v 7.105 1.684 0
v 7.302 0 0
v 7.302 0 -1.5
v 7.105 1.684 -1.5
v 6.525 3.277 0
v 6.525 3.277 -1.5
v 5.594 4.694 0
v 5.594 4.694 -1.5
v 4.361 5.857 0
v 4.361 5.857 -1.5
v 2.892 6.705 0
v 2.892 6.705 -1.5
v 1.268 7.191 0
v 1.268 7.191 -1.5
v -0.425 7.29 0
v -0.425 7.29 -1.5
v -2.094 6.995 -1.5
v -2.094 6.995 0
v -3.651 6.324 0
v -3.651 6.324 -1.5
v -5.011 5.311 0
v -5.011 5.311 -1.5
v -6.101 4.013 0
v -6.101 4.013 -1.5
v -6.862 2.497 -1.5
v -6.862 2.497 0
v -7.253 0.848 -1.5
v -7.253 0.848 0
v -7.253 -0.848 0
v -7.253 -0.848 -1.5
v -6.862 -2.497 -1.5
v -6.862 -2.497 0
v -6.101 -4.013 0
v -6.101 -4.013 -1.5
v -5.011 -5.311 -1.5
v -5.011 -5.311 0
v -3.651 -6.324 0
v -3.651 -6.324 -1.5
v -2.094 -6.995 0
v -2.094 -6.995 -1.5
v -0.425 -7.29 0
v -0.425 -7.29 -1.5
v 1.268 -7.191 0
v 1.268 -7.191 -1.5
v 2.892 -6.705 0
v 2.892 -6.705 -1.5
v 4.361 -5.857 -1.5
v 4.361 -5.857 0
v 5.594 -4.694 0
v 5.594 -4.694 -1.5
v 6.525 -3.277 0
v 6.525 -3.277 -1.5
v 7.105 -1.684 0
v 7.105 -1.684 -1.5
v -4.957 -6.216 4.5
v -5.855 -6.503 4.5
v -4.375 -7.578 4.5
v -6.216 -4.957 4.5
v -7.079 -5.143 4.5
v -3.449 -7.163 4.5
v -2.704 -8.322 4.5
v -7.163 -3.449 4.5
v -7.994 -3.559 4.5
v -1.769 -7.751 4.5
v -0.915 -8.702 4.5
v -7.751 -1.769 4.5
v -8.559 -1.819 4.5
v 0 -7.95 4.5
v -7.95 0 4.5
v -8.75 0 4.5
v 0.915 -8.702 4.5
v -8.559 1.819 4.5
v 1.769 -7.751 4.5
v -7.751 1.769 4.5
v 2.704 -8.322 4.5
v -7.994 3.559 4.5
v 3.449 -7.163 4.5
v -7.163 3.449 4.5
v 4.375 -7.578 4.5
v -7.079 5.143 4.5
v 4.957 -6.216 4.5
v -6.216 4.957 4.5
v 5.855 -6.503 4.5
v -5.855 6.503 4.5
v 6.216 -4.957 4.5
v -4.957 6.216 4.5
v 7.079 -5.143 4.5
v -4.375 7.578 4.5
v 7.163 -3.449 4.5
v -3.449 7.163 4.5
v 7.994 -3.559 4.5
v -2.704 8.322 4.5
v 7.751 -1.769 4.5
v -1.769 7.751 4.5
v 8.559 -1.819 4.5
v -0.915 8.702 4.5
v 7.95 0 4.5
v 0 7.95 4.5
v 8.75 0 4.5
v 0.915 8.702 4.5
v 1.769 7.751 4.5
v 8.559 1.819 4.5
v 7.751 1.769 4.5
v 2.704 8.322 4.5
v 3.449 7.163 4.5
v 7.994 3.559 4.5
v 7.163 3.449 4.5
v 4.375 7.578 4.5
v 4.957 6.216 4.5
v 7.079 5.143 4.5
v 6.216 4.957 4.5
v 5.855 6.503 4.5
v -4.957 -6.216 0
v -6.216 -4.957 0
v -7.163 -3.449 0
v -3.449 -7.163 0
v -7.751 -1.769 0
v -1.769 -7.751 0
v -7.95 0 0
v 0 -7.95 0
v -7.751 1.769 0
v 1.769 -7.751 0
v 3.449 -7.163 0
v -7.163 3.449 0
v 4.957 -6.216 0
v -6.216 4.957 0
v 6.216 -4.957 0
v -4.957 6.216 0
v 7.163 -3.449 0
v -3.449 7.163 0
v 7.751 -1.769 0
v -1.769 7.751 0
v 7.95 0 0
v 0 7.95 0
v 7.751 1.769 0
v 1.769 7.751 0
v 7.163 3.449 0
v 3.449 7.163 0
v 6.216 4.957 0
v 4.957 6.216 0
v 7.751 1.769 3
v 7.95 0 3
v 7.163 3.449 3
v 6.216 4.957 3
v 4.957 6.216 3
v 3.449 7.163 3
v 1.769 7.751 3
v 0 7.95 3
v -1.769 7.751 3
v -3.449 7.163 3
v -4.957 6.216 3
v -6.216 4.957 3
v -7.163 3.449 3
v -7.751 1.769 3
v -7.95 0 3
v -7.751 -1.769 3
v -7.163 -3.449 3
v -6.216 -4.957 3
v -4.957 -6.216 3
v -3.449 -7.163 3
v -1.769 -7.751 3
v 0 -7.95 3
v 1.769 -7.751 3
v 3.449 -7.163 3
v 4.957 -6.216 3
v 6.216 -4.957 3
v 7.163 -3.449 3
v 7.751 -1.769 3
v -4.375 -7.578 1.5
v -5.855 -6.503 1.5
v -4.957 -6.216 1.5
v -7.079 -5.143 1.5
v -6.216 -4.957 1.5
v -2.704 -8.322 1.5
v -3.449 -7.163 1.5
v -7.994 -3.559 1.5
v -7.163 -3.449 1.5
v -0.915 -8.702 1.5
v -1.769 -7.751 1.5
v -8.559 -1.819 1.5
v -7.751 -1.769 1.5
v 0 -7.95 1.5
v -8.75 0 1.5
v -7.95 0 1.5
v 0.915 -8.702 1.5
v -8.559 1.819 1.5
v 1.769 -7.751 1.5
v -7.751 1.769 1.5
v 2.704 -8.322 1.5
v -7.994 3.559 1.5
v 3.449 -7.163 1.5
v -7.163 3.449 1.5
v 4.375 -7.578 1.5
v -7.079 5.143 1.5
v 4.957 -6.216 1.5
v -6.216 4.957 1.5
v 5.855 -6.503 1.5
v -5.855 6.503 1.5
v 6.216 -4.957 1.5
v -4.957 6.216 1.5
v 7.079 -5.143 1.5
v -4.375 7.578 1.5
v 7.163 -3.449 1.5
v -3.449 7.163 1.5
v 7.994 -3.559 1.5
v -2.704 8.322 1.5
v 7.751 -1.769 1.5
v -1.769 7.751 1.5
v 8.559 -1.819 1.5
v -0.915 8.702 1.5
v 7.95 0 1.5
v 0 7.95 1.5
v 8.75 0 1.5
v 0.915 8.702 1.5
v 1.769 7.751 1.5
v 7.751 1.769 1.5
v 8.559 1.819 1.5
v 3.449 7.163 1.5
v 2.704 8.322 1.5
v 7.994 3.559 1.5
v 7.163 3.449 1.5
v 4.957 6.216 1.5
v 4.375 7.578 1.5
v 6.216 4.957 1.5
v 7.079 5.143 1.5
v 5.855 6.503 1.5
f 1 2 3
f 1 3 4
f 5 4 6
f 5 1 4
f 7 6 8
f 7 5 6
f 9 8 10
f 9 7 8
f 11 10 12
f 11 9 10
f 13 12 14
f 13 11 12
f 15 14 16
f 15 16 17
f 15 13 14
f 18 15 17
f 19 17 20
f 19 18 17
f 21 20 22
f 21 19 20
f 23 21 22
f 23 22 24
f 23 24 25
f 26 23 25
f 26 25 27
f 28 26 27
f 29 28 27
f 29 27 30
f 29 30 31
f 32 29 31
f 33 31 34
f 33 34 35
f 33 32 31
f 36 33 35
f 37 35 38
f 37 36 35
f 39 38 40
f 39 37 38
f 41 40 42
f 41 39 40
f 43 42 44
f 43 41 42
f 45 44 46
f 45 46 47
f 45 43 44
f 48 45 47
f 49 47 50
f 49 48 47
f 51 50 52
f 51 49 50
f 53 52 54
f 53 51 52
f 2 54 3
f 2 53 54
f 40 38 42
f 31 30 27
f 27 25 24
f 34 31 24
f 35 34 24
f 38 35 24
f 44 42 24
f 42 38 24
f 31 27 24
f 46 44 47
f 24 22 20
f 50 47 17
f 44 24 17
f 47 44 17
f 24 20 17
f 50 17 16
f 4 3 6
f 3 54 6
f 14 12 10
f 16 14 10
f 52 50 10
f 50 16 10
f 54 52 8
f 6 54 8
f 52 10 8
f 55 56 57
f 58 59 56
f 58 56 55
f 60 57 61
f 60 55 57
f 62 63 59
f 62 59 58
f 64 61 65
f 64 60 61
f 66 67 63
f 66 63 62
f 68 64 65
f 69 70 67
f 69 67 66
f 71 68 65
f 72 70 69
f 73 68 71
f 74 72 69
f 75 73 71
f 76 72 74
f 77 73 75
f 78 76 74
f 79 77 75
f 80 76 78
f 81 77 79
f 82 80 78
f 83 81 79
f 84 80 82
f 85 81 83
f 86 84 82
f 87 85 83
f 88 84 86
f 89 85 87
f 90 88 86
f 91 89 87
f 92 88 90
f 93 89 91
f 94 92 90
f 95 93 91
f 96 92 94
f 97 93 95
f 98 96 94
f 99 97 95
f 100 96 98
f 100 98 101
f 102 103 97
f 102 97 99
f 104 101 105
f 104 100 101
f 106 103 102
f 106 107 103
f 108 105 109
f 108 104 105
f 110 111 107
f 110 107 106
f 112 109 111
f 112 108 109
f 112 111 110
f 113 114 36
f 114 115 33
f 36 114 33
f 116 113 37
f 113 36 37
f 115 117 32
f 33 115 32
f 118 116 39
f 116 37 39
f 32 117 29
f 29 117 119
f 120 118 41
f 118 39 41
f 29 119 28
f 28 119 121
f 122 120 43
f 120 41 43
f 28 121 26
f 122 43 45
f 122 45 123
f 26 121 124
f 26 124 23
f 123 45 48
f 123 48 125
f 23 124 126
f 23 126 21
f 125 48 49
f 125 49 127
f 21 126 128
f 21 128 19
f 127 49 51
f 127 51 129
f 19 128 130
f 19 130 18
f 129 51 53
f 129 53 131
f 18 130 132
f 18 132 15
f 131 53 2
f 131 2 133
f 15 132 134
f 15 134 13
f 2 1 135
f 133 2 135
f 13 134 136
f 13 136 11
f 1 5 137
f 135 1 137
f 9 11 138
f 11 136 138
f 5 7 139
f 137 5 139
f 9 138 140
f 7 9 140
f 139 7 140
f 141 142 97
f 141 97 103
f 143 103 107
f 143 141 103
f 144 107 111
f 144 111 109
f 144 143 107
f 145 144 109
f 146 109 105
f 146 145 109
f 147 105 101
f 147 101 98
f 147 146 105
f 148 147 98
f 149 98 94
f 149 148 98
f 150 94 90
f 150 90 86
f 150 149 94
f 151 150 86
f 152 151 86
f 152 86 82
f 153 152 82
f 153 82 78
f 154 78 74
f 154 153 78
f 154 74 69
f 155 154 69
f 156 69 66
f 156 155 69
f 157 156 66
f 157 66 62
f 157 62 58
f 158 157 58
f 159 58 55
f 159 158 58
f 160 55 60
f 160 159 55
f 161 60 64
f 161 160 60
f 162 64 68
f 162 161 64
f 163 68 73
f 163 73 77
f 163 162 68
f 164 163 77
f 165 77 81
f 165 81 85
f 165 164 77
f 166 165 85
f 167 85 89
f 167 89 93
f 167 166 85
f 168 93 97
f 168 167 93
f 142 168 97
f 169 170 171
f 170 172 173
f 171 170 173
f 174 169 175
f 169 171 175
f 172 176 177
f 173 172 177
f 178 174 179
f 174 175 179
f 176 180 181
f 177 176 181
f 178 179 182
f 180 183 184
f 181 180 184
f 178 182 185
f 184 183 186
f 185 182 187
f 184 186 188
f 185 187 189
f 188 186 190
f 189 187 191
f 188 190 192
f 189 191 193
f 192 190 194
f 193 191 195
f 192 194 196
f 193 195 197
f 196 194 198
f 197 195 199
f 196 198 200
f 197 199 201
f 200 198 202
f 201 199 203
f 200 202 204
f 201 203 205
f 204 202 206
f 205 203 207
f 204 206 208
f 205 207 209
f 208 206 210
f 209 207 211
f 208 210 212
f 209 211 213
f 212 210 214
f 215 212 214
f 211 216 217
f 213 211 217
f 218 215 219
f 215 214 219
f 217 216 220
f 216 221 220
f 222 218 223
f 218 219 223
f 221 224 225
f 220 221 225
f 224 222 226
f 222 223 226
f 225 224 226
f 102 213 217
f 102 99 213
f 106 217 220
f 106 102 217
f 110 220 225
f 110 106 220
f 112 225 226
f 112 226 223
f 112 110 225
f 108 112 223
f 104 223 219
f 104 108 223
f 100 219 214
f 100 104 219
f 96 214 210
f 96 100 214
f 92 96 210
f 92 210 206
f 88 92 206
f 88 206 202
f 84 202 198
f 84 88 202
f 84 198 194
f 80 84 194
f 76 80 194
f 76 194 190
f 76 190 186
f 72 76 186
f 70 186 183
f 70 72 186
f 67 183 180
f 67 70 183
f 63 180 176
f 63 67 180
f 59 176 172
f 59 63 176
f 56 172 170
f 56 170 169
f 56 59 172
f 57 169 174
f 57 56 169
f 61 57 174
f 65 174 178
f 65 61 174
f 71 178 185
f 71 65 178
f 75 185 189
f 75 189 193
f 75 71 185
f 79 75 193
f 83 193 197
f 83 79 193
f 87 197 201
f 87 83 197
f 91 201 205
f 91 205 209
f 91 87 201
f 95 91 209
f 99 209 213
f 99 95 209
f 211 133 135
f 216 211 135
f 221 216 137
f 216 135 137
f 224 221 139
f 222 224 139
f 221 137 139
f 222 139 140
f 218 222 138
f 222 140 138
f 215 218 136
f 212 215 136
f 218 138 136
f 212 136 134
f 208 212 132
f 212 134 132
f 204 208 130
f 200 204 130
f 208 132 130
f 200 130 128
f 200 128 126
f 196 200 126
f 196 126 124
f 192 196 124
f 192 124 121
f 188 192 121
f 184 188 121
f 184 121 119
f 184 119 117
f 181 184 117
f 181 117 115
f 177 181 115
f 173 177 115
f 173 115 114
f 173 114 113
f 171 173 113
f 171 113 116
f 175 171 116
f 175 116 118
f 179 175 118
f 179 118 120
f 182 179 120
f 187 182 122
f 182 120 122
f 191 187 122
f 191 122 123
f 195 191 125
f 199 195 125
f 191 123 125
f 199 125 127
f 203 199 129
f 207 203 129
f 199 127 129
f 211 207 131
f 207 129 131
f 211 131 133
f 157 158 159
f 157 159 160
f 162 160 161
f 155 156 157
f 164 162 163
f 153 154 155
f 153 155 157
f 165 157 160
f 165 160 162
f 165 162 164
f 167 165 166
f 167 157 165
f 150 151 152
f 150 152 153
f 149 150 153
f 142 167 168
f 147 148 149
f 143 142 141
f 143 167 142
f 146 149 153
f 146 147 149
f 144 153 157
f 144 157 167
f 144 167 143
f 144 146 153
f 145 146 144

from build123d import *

# Parameters (mm, degrees)
F0_R     = 7.95
F2_DEPTH = 3
F4_R     = 8.75
F4_R_2   = 7.95
F5_DEPTH = 1.5
F3_R     = 7.302196
F6_DEPTH = 1.5


with BuildPart() as f2:
    # F0 (on Top) → F2 (new body)
    with BuildSketch(Plane.XY):
        Circle(F0_R)
    extrude(amount=F2_DEPTH)

    # F4 (on face) → F5 (join, symmetric)
    with BuildSketch(Plane.XY.offset(3)):
        Circle(F4_R)
        Circle(F4_R_2, mode=Mode.SUBTRACT)
    extrude(amount=F5_DEPTH, both=True)

    # F3 (on Top) → F6 (join, symmetric)
    with BuildSketch(Plane.XY):
        Circle(F3_R)
    extrude(amount=F6_DEPTH, both=True)


solid = f2.part
